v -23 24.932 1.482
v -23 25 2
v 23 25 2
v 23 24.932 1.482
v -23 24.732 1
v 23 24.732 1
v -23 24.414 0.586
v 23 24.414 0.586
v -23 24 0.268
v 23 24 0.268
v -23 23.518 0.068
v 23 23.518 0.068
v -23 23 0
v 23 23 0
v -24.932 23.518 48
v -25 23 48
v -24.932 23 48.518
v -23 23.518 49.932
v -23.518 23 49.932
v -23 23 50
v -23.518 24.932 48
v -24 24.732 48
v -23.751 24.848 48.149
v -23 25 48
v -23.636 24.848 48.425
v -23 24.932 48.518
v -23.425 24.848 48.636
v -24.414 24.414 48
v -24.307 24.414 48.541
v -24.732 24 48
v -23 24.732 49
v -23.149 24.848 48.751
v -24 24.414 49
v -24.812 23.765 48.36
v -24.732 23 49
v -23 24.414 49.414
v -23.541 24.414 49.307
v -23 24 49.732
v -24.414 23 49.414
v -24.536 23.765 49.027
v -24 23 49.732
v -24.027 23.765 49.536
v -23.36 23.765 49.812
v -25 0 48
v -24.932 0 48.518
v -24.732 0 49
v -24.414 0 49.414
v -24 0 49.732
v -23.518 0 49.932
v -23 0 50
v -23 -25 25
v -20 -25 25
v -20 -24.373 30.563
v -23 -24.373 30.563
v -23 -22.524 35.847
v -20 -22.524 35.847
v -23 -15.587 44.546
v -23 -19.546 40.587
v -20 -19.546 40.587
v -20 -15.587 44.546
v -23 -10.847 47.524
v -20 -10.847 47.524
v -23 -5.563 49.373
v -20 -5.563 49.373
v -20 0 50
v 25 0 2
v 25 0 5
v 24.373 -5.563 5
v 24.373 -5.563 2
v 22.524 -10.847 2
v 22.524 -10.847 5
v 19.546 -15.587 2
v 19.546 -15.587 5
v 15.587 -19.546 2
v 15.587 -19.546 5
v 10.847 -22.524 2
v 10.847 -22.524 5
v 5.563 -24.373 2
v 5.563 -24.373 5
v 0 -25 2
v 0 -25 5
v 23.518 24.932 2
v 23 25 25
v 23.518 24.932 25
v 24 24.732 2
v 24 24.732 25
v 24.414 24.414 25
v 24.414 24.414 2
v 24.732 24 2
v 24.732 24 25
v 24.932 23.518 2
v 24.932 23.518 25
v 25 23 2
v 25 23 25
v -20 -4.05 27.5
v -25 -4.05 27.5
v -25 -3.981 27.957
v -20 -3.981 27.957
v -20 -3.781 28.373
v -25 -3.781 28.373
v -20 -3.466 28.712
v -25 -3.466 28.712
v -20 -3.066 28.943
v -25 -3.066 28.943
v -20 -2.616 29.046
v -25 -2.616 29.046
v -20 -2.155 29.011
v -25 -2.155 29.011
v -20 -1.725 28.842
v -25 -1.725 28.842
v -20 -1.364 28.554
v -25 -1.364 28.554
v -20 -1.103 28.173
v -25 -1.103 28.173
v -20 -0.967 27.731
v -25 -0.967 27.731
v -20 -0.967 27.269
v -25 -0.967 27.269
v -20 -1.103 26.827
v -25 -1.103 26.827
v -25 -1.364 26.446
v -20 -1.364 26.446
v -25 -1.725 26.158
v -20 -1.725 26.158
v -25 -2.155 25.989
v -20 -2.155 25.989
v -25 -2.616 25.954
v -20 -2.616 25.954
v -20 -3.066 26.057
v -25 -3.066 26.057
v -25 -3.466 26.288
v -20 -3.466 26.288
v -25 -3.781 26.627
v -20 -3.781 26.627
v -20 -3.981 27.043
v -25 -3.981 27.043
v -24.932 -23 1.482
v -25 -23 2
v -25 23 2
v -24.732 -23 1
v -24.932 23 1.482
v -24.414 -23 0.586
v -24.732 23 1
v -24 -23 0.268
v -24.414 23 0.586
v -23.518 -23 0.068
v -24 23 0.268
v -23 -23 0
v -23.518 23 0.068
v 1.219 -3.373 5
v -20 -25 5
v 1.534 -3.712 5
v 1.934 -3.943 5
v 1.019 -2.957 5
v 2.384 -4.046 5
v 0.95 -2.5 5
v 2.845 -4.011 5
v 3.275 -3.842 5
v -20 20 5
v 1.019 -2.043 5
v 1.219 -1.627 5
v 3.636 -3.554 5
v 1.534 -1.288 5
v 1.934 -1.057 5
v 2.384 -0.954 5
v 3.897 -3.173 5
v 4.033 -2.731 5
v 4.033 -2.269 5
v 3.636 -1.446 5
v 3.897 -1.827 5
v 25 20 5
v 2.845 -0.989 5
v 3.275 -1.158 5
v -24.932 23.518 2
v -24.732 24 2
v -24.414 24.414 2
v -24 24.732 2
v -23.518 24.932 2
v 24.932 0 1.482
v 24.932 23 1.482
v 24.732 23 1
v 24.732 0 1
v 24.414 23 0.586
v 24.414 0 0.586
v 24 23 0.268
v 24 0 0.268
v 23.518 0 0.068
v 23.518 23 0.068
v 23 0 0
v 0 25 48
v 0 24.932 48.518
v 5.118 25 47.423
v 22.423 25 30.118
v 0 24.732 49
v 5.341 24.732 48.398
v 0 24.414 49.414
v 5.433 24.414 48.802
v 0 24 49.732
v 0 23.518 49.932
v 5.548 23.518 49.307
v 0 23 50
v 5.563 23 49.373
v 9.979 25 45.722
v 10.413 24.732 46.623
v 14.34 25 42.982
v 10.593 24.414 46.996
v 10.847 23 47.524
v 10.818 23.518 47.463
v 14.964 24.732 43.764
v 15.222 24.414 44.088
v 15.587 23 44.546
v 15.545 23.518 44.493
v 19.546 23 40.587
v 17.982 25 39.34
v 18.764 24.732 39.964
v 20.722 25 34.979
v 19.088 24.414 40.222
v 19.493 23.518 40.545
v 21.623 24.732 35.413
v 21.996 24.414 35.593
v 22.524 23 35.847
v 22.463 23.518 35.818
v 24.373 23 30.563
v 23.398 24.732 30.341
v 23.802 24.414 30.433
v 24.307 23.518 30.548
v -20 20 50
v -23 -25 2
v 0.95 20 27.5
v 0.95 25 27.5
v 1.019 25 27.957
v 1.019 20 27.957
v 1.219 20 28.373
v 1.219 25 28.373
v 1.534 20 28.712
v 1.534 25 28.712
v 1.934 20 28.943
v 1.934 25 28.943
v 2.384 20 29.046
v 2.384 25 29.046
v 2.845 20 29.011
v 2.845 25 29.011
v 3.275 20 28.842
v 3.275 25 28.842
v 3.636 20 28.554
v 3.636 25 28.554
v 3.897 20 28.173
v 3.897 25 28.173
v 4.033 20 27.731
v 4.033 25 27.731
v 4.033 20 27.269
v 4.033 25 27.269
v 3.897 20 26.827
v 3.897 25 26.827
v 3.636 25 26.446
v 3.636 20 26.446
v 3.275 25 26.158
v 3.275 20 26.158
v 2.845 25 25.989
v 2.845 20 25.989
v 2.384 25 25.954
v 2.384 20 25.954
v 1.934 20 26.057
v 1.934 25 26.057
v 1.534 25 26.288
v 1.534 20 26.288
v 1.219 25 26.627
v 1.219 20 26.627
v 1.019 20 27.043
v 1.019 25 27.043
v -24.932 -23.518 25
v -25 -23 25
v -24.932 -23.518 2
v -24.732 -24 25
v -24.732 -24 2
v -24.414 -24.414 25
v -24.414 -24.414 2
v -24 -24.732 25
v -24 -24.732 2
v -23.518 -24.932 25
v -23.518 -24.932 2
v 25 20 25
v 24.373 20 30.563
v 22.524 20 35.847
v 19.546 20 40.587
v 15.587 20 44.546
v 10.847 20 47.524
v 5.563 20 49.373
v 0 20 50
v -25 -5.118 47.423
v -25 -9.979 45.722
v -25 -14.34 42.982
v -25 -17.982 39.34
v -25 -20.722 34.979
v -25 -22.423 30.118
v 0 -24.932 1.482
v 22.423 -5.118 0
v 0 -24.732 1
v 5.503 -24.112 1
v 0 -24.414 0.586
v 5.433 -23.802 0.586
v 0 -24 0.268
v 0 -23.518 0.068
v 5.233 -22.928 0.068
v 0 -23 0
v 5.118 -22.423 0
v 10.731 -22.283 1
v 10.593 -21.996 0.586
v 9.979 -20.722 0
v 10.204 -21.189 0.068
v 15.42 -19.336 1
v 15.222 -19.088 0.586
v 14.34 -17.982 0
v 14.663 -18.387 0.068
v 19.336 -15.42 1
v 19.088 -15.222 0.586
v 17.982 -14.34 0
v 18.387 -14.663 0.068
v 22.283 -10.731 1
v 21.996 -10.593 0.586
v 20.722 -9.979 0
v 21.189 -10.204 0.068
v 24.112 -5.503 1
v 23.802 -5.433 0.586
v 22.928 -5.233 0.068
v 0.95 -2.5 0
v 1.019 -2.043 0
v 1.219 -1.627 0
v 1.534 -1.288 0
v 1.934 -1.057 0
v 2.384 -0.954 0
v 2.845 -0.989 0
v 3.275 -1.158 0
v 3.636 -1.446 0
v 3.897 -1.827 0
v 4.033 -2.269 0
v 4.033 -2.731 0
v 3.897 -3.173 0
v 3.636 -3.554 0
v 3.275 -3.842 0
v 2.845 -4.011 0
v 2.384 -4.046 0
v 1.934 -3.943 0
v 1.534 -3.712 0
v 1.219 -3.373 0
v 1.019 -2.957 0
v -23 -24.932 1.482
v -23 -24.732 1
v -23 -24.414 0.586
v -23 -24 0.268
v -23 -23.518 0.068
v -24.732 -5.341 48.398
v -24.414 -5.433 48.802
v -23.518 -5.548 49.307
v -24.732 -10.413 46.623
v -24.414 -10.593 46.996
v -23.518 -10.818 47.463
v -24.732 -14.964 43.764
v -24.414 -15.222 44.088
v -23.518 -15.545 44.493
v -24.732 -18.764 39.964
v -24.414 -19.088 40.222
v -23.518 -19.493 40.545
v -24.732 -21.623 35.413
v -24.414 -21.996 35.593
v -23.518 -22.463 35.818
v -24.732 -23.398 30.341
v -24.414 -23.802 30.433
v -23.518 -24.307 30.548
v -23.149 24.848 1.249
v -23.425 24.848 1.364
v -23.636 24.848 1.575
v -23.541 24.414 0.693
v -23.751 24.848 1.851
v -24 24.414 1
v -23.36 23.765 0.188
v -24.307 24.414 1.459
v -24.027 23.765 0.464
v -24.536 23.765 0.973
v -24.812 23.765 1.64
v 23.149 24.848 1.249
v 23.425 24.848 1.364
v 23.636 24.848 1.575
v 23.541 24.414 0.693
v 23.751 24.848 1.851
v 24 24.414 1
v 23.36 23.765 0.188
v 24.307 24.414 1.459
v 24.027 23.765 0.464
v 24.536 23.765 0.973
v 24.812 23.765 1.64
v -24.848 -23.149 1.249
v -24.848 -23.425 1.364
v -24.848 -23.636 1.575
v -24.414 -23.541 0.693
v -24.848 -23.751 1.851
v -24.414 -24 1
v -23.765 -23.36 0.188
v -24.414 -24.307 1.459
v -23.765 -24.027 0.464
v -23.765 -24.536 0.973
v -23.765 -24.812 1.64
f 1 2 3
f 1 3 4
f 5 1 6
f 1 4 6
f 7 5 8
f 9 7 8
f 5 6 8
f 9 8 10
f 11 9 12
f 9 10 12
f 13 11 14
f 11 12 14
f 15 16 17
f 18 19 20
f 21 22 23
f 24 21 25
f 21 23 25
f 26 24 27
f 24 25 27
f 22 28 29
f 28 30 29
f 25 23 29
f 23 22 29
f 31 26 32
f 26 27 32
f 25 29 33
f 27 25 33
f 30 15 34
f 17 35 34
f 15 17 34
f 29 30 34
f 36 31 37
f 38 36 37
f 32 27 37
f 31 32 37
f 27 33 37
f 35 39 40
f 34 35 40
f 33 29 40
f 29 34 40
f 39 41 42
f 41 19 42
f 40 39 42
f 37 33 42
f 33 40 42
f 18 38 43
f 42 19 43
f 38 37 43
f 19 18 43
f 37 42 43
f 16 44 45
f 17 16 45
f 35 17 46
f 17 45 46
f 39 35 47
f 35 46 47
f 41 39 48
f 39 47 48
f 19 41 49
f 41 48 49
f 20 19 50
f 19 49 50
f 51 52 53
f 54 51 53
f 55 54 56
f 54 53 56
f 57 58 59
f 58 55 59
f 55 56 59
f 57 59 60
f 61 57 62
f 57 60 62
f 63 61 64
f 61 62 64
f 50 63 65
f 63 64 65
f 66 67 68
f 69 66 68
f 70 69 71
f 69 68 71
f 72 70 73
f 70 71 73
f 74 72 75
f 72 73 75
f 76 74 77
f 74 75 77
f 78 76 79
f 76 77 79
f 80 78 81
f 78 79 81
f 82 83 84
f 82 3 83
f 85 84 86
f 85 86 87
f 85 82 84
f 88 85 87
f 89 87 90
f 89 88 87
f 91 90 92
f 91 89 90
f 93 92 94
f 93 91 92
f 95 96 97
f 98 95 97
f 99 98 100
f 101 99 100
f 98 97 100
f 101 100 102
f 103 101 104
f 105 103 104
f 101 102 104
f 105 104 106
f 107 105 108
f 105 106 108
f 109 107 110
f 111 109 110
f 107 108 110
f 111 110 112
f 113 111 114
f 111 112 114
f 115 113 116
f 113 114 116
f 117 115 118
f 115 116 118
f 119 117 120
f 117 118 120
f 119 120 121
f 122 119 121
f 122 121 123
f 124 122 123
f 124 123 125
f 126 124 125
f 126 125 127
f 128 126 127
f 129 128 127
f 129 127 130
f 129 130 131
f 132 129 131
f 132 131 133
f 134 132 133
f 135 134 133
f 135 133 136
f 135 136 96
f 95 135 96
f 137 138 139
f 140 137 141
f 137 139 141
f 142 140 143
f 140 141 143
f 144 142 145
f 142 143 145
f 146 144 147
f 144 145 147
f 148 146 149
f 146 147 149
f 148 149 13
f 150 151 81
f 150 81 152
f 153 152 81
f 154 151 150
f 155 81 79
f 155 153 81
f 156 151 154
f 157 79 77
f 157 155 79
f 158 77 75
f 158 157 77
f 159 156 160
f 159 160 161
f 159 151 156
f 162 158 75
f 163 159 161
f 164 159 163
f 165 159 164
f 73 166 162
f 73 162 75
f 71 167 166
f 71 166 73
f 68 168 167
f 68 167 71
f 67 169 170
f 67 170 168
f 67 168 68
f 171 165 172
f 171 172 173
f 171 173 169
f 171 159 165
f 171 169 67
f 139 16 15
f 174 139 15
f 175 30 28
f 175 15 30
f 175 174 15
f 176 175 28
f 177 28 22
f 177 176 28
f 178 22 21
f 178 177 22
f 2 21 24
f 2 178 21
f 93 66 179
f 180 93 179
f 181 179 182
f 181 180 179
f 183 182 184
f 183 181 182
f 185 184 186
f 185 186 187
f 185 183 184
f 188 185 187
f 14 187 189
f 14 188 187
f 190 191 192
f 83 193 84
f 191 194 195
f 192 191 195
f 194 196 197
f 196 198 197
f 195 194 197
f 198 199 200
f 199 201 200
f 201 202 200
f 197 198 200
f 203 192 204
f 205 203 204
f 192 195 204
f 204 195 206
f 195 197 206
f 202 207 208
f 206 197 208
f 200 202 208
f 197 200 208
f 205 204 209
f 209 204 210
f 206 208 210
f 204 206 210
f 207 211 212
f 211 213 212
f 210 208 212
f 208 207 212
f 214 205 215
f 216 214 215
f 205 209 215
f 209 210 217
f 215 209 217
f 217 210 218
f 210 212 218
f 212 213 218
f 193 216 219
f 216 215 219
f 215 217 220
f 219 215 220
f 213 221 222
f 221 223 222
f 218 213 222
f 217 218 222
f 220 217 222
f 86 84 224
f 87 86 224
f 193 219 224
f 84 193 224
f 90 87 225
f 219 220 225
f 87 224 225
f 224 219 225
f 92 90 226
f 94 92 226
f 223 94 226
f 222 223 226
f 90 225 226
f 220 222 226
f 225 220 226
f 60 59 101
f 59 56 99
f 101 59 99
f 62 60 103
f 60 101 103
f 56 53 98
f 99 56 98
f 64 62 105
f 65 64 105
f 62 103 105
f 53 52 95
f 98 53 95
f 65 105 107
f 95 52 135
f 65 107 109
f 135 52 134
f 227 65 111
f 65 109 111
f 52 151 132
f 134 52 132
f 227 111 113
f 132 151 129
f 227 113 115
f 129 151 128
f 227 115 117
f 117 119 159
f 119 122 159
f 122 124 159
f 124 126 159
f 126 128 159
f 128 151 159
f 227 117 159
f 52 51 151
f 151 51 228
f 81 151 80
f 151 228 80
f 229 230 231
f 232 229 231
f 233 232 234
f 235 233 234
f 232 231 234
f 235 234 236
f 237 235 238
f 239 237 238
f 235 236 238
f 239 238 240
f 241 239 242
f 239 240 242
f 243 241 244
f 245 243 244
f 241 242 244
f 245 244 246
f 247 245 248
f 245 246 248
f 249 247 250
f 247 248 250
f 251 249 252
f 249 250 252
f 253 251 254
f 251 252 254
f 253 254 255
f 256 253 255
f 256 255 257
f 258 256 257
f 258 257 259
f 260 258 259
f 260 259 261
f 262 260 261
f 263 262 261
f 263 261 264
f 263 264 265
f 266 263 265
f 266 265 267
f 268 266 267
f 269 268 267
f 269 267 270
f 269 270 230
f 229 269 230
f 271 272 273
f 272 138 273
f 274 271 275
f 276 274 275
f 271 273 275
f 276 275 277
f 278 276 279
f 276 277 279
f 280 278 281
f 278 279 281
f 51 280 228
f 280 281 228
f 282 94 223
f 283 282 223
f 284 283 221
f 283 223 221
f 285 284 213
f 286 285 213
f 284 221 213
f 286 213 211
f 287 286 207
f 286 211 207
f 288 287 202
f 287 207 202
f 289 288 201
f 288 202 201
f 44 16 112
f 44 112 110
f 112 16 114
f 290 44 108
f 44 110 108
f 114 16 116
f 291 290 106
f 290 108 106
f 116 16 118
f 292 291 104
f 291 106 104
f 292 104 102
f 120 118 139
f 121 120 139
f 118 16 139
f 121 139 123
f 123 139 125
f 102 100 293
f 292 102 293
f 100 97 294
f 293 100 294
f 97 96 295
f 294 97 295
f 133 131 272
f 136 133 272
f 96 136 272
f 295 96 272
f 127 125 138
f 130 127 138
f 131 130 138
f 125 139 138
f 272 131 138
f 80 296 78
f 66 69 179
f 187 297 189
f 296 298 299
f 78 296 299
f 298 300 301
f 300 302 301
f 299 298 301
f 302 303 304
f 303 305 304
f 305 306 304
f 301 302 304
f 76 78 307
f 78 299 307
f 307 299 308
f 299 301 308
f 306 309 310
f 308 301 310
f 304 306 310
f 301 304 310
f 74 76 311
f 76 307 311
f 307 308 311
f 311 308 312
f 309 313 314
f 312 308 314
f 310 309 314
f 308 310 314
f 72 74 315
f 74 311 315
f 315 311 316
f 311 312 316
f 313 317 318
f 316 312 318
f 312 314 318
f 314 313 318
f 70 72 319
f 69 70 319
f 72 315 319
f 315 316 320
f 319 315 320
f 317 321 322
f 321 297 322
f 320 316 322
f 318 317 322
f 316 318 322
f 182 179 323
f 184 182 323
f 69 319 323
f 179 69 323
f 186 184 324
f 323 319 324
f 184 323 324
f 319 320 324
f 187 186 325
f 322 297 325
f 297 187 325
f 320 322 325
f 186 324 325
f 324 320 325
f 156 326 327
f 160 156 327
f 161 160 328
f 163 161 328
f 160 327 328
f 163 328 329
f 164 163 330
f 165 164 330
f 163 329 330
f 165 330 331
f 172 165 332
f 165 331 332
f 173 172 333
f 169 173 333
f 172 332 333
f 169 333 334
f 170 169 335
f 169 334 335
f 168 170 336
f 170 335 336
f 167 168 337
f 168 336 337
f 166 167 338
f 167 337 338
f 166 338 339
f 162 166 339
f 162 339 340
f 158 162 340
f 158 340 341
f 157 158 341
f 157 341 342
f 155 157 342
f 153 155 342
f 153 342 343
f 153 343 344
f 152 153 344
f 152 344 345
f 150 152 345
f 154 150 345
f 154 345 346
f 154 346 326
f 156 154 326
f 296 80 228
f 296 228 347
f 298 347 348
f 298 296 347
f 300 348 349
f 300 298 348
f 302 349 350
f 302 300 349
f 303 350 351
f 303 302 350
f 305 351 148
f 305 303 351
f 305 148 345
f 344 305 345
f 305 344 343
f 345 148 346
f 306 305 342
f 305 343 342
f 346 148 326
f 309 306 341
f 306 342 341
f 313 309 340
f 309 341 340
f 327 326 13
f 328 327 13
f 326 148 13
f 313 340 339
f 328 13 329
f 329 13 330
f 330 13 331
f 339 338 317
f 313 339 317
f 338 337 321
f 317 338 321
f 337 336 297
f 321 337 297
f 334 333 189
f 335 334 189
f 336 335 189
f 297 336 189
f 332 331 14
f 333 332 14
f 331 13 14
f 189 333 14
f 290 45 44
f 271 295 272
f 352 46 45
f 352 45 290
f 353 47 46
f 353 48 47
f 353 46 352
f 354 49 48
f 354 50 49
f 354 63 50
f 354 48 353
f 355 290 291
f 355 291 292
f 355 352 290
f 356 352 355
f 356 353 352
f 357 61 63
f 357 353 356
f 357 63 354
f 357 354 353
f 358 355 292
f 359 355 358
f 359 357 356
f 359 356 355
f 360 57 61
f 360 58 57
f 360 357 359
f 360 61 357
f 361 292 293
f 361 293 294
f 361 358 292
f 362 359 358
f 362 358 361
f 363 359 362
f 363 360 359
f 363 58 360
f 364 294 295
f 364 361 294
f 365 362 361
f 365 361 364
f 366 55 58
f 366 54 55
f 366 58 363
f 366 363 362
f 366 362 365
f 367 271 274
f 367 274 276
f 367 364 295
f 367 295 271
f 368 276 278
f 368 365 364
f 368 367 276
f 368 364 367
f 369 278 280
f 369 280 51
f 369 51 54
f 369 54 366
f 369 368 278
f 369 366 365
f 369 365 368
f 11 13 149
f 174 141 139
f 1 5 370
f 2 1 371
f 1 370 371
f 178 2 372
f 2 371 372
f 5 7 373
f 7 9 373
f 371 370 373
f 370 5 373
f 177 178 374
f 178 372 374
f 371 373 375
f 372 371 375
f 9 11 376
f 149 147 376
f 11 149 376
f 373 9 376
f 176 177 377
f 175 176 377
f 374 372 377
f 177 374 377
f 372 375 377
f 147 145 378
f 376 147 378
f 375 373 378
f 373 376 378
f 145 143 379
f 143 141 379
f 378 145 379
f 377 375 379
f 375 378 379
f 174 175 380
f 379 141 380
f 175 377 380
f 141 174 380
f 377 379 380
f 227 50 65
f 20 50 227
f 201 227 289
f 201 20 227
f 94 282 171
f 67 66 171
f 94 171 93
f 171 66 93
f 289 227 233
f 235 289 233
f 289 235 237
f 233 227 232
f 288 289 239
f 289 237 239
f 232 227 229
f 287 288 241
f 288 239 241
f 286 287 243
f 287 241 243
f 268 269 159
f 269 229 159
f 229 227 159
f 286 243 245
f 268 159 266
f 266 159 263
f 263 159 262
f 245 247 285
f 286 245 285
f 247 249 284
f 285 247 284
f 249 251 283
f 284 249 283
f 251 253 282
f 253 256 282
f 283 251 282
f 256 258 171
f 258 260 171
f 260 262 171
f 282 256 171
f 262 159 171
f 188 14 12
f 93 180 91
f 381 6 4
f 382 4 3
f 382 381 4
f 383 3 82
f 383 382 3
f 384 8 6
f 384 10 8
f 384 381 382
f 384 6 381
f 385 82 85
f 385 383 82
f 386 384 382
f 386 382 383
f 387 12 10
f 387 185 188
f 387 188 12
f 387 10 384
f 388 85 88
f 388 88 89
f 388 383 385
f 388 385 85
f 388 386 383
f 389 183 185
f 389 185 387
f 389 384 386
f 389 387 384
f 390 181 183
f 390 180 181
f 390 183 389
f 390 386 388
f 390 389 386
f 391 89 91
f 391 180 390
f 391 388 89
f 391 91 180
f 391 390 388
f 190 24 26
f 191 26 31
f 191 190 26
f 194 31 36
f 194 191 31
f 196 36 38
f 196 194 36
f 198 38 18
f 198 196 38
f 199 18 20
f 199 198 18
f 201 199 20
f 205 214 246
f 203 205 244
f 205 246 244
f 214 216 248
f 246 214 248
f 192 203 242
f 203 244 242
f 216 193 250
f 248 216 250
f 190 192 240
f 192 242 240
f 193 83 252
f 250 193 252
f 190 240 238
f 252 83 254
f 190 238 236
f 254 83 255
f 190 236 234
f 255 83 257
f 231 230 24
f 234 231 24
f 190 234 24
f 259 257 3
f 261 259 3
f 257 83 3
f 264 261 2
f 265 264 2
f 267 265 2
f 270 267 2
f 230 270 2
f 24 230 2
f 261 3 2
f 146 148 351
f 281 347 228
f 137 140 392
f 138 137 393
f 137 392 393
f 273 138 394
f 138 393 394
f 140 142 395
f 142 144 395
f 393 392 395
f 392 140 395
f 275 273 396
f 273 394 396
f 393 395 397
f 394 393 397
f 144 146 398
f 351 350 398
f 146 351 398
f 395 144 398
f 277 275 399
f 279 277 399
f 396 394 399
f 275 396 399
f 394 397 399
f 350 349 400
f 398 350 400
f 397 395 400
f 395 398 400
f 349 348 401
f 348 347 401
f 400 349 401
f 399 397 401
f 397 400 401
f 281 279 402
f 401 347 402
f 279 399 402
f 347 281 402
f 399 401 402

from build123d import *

# Parameters (mm, degrees)
F0_W           = 50
F0_H           = 50
F1_DEPTH       = 5
F2_W           = 45
F2_H           = 5
F3_DEPTH       = 45
F4_R           = 25
F5_R           = 2
F9_D           = 3.1
F9_DEPTH       = 20
F9_TIP         = 0.9313339595
F9_ON_F6_D     = 3.1
F9_ON_F6_DEPTH = 20
F9_ON_F6_TIP   = 0.9313339595
F9_ON_F8_D     = 3.1
F9_ON_F8_DEPTH = 20
F9_ON_F8_TIP   = 0.9313339595


with BuildPart() as f1:
    # F0 (on Top) → F1 (new body)
    with BuildSketch(Plane.XY):
        Rectangle(F0_W, F0_H)
    extrude(amount=F1_DEPTH)

    # F2 (on face) → F3 (join)
    with BuildSketch(Plane.XY.offset(5)):
        Polygon((-20, 25), (-25, 25), (-25, -25), (-20, -25), (-20, 20), align=None)
        with Locations((2.5, 22.5)):
            Rectangle(F2_W, F2_H)
    extrude(amount=F3_DEPTH)

    # F4
    f4_edges = [f1.edges().sort_by_distance(p)[0] for p in [
        (25, 22.5, 50),
        (-22.5, -25, 50),
        (25, -25, 2.5),
    ]]
    fillet(f4_edges, radius=F4_R)

    # F5
    f5_edges = [f1.edges().sort_by_distance(p)[0] for p in [
        (-12.5, -25, 0),
        (17.67767, -17.67767, 0),
        (-25, 0, 0),
        (25, 12.5, 0),
        (0, 25, 0),
        (-25, 12.5, 50),
        (-25, -17.67767, 42.67767),
        (-25, 25, 25),
        (-25, -25, 12.5),
        (25, 25, 12.5),
        (17.67767, 25, 42.67767),
        (-12.5, 25, 50),
    ]]
    fillet(f5_edges, radius=F5_R)

    # F9
    with Locations(Plane.YZ.offset(-20)):
        with Locations((-2.5, 27.5)):
            Hole(F9_D / 2, depth=F9_DEPTH)
            with Locations((0, 0, -(F9_DEPTH + F9_TIP / 2))):  # 118° drill point
                Cone(0, F9_D / 2, F9_TIP, mode=Mode.SUBTRACT)

    # F9 on F6
    with Locations(Plane.XY.offset(5)):
        with Locations((2.5, -2.5)):
            Hole(F9_ON_F6_D / 2, depth=F9_ON_F6_DEPTH)
            with Locations((0, 0, -(F9_ON_F6_DEPTH + F9_ON_F6_TIP / 2))):  # 118° drill point
                Cone(0, F9_ON_F6_D / 2, F9_ON_F6_TIP, mode=Mode.SUBTRACT)

    # F9 on F8
    with Locations(Plane.XZ.offset(-20)):
        with Locations((2.5, 27.5)):
            Hole(F9_ON_F8_D / 2, depth=F9_ON_F8_DEPTH)
            with Locations((0, 0, -(F9_ON_F8_DEPTH + F9_ON_F8_TIP / 2))):  # 118° drill point
                Cone(0, F9_ON_F8_D / 2, F9_ON_F8_TIP, mode=Mode.SUBTRACT)


solid = f1.part
